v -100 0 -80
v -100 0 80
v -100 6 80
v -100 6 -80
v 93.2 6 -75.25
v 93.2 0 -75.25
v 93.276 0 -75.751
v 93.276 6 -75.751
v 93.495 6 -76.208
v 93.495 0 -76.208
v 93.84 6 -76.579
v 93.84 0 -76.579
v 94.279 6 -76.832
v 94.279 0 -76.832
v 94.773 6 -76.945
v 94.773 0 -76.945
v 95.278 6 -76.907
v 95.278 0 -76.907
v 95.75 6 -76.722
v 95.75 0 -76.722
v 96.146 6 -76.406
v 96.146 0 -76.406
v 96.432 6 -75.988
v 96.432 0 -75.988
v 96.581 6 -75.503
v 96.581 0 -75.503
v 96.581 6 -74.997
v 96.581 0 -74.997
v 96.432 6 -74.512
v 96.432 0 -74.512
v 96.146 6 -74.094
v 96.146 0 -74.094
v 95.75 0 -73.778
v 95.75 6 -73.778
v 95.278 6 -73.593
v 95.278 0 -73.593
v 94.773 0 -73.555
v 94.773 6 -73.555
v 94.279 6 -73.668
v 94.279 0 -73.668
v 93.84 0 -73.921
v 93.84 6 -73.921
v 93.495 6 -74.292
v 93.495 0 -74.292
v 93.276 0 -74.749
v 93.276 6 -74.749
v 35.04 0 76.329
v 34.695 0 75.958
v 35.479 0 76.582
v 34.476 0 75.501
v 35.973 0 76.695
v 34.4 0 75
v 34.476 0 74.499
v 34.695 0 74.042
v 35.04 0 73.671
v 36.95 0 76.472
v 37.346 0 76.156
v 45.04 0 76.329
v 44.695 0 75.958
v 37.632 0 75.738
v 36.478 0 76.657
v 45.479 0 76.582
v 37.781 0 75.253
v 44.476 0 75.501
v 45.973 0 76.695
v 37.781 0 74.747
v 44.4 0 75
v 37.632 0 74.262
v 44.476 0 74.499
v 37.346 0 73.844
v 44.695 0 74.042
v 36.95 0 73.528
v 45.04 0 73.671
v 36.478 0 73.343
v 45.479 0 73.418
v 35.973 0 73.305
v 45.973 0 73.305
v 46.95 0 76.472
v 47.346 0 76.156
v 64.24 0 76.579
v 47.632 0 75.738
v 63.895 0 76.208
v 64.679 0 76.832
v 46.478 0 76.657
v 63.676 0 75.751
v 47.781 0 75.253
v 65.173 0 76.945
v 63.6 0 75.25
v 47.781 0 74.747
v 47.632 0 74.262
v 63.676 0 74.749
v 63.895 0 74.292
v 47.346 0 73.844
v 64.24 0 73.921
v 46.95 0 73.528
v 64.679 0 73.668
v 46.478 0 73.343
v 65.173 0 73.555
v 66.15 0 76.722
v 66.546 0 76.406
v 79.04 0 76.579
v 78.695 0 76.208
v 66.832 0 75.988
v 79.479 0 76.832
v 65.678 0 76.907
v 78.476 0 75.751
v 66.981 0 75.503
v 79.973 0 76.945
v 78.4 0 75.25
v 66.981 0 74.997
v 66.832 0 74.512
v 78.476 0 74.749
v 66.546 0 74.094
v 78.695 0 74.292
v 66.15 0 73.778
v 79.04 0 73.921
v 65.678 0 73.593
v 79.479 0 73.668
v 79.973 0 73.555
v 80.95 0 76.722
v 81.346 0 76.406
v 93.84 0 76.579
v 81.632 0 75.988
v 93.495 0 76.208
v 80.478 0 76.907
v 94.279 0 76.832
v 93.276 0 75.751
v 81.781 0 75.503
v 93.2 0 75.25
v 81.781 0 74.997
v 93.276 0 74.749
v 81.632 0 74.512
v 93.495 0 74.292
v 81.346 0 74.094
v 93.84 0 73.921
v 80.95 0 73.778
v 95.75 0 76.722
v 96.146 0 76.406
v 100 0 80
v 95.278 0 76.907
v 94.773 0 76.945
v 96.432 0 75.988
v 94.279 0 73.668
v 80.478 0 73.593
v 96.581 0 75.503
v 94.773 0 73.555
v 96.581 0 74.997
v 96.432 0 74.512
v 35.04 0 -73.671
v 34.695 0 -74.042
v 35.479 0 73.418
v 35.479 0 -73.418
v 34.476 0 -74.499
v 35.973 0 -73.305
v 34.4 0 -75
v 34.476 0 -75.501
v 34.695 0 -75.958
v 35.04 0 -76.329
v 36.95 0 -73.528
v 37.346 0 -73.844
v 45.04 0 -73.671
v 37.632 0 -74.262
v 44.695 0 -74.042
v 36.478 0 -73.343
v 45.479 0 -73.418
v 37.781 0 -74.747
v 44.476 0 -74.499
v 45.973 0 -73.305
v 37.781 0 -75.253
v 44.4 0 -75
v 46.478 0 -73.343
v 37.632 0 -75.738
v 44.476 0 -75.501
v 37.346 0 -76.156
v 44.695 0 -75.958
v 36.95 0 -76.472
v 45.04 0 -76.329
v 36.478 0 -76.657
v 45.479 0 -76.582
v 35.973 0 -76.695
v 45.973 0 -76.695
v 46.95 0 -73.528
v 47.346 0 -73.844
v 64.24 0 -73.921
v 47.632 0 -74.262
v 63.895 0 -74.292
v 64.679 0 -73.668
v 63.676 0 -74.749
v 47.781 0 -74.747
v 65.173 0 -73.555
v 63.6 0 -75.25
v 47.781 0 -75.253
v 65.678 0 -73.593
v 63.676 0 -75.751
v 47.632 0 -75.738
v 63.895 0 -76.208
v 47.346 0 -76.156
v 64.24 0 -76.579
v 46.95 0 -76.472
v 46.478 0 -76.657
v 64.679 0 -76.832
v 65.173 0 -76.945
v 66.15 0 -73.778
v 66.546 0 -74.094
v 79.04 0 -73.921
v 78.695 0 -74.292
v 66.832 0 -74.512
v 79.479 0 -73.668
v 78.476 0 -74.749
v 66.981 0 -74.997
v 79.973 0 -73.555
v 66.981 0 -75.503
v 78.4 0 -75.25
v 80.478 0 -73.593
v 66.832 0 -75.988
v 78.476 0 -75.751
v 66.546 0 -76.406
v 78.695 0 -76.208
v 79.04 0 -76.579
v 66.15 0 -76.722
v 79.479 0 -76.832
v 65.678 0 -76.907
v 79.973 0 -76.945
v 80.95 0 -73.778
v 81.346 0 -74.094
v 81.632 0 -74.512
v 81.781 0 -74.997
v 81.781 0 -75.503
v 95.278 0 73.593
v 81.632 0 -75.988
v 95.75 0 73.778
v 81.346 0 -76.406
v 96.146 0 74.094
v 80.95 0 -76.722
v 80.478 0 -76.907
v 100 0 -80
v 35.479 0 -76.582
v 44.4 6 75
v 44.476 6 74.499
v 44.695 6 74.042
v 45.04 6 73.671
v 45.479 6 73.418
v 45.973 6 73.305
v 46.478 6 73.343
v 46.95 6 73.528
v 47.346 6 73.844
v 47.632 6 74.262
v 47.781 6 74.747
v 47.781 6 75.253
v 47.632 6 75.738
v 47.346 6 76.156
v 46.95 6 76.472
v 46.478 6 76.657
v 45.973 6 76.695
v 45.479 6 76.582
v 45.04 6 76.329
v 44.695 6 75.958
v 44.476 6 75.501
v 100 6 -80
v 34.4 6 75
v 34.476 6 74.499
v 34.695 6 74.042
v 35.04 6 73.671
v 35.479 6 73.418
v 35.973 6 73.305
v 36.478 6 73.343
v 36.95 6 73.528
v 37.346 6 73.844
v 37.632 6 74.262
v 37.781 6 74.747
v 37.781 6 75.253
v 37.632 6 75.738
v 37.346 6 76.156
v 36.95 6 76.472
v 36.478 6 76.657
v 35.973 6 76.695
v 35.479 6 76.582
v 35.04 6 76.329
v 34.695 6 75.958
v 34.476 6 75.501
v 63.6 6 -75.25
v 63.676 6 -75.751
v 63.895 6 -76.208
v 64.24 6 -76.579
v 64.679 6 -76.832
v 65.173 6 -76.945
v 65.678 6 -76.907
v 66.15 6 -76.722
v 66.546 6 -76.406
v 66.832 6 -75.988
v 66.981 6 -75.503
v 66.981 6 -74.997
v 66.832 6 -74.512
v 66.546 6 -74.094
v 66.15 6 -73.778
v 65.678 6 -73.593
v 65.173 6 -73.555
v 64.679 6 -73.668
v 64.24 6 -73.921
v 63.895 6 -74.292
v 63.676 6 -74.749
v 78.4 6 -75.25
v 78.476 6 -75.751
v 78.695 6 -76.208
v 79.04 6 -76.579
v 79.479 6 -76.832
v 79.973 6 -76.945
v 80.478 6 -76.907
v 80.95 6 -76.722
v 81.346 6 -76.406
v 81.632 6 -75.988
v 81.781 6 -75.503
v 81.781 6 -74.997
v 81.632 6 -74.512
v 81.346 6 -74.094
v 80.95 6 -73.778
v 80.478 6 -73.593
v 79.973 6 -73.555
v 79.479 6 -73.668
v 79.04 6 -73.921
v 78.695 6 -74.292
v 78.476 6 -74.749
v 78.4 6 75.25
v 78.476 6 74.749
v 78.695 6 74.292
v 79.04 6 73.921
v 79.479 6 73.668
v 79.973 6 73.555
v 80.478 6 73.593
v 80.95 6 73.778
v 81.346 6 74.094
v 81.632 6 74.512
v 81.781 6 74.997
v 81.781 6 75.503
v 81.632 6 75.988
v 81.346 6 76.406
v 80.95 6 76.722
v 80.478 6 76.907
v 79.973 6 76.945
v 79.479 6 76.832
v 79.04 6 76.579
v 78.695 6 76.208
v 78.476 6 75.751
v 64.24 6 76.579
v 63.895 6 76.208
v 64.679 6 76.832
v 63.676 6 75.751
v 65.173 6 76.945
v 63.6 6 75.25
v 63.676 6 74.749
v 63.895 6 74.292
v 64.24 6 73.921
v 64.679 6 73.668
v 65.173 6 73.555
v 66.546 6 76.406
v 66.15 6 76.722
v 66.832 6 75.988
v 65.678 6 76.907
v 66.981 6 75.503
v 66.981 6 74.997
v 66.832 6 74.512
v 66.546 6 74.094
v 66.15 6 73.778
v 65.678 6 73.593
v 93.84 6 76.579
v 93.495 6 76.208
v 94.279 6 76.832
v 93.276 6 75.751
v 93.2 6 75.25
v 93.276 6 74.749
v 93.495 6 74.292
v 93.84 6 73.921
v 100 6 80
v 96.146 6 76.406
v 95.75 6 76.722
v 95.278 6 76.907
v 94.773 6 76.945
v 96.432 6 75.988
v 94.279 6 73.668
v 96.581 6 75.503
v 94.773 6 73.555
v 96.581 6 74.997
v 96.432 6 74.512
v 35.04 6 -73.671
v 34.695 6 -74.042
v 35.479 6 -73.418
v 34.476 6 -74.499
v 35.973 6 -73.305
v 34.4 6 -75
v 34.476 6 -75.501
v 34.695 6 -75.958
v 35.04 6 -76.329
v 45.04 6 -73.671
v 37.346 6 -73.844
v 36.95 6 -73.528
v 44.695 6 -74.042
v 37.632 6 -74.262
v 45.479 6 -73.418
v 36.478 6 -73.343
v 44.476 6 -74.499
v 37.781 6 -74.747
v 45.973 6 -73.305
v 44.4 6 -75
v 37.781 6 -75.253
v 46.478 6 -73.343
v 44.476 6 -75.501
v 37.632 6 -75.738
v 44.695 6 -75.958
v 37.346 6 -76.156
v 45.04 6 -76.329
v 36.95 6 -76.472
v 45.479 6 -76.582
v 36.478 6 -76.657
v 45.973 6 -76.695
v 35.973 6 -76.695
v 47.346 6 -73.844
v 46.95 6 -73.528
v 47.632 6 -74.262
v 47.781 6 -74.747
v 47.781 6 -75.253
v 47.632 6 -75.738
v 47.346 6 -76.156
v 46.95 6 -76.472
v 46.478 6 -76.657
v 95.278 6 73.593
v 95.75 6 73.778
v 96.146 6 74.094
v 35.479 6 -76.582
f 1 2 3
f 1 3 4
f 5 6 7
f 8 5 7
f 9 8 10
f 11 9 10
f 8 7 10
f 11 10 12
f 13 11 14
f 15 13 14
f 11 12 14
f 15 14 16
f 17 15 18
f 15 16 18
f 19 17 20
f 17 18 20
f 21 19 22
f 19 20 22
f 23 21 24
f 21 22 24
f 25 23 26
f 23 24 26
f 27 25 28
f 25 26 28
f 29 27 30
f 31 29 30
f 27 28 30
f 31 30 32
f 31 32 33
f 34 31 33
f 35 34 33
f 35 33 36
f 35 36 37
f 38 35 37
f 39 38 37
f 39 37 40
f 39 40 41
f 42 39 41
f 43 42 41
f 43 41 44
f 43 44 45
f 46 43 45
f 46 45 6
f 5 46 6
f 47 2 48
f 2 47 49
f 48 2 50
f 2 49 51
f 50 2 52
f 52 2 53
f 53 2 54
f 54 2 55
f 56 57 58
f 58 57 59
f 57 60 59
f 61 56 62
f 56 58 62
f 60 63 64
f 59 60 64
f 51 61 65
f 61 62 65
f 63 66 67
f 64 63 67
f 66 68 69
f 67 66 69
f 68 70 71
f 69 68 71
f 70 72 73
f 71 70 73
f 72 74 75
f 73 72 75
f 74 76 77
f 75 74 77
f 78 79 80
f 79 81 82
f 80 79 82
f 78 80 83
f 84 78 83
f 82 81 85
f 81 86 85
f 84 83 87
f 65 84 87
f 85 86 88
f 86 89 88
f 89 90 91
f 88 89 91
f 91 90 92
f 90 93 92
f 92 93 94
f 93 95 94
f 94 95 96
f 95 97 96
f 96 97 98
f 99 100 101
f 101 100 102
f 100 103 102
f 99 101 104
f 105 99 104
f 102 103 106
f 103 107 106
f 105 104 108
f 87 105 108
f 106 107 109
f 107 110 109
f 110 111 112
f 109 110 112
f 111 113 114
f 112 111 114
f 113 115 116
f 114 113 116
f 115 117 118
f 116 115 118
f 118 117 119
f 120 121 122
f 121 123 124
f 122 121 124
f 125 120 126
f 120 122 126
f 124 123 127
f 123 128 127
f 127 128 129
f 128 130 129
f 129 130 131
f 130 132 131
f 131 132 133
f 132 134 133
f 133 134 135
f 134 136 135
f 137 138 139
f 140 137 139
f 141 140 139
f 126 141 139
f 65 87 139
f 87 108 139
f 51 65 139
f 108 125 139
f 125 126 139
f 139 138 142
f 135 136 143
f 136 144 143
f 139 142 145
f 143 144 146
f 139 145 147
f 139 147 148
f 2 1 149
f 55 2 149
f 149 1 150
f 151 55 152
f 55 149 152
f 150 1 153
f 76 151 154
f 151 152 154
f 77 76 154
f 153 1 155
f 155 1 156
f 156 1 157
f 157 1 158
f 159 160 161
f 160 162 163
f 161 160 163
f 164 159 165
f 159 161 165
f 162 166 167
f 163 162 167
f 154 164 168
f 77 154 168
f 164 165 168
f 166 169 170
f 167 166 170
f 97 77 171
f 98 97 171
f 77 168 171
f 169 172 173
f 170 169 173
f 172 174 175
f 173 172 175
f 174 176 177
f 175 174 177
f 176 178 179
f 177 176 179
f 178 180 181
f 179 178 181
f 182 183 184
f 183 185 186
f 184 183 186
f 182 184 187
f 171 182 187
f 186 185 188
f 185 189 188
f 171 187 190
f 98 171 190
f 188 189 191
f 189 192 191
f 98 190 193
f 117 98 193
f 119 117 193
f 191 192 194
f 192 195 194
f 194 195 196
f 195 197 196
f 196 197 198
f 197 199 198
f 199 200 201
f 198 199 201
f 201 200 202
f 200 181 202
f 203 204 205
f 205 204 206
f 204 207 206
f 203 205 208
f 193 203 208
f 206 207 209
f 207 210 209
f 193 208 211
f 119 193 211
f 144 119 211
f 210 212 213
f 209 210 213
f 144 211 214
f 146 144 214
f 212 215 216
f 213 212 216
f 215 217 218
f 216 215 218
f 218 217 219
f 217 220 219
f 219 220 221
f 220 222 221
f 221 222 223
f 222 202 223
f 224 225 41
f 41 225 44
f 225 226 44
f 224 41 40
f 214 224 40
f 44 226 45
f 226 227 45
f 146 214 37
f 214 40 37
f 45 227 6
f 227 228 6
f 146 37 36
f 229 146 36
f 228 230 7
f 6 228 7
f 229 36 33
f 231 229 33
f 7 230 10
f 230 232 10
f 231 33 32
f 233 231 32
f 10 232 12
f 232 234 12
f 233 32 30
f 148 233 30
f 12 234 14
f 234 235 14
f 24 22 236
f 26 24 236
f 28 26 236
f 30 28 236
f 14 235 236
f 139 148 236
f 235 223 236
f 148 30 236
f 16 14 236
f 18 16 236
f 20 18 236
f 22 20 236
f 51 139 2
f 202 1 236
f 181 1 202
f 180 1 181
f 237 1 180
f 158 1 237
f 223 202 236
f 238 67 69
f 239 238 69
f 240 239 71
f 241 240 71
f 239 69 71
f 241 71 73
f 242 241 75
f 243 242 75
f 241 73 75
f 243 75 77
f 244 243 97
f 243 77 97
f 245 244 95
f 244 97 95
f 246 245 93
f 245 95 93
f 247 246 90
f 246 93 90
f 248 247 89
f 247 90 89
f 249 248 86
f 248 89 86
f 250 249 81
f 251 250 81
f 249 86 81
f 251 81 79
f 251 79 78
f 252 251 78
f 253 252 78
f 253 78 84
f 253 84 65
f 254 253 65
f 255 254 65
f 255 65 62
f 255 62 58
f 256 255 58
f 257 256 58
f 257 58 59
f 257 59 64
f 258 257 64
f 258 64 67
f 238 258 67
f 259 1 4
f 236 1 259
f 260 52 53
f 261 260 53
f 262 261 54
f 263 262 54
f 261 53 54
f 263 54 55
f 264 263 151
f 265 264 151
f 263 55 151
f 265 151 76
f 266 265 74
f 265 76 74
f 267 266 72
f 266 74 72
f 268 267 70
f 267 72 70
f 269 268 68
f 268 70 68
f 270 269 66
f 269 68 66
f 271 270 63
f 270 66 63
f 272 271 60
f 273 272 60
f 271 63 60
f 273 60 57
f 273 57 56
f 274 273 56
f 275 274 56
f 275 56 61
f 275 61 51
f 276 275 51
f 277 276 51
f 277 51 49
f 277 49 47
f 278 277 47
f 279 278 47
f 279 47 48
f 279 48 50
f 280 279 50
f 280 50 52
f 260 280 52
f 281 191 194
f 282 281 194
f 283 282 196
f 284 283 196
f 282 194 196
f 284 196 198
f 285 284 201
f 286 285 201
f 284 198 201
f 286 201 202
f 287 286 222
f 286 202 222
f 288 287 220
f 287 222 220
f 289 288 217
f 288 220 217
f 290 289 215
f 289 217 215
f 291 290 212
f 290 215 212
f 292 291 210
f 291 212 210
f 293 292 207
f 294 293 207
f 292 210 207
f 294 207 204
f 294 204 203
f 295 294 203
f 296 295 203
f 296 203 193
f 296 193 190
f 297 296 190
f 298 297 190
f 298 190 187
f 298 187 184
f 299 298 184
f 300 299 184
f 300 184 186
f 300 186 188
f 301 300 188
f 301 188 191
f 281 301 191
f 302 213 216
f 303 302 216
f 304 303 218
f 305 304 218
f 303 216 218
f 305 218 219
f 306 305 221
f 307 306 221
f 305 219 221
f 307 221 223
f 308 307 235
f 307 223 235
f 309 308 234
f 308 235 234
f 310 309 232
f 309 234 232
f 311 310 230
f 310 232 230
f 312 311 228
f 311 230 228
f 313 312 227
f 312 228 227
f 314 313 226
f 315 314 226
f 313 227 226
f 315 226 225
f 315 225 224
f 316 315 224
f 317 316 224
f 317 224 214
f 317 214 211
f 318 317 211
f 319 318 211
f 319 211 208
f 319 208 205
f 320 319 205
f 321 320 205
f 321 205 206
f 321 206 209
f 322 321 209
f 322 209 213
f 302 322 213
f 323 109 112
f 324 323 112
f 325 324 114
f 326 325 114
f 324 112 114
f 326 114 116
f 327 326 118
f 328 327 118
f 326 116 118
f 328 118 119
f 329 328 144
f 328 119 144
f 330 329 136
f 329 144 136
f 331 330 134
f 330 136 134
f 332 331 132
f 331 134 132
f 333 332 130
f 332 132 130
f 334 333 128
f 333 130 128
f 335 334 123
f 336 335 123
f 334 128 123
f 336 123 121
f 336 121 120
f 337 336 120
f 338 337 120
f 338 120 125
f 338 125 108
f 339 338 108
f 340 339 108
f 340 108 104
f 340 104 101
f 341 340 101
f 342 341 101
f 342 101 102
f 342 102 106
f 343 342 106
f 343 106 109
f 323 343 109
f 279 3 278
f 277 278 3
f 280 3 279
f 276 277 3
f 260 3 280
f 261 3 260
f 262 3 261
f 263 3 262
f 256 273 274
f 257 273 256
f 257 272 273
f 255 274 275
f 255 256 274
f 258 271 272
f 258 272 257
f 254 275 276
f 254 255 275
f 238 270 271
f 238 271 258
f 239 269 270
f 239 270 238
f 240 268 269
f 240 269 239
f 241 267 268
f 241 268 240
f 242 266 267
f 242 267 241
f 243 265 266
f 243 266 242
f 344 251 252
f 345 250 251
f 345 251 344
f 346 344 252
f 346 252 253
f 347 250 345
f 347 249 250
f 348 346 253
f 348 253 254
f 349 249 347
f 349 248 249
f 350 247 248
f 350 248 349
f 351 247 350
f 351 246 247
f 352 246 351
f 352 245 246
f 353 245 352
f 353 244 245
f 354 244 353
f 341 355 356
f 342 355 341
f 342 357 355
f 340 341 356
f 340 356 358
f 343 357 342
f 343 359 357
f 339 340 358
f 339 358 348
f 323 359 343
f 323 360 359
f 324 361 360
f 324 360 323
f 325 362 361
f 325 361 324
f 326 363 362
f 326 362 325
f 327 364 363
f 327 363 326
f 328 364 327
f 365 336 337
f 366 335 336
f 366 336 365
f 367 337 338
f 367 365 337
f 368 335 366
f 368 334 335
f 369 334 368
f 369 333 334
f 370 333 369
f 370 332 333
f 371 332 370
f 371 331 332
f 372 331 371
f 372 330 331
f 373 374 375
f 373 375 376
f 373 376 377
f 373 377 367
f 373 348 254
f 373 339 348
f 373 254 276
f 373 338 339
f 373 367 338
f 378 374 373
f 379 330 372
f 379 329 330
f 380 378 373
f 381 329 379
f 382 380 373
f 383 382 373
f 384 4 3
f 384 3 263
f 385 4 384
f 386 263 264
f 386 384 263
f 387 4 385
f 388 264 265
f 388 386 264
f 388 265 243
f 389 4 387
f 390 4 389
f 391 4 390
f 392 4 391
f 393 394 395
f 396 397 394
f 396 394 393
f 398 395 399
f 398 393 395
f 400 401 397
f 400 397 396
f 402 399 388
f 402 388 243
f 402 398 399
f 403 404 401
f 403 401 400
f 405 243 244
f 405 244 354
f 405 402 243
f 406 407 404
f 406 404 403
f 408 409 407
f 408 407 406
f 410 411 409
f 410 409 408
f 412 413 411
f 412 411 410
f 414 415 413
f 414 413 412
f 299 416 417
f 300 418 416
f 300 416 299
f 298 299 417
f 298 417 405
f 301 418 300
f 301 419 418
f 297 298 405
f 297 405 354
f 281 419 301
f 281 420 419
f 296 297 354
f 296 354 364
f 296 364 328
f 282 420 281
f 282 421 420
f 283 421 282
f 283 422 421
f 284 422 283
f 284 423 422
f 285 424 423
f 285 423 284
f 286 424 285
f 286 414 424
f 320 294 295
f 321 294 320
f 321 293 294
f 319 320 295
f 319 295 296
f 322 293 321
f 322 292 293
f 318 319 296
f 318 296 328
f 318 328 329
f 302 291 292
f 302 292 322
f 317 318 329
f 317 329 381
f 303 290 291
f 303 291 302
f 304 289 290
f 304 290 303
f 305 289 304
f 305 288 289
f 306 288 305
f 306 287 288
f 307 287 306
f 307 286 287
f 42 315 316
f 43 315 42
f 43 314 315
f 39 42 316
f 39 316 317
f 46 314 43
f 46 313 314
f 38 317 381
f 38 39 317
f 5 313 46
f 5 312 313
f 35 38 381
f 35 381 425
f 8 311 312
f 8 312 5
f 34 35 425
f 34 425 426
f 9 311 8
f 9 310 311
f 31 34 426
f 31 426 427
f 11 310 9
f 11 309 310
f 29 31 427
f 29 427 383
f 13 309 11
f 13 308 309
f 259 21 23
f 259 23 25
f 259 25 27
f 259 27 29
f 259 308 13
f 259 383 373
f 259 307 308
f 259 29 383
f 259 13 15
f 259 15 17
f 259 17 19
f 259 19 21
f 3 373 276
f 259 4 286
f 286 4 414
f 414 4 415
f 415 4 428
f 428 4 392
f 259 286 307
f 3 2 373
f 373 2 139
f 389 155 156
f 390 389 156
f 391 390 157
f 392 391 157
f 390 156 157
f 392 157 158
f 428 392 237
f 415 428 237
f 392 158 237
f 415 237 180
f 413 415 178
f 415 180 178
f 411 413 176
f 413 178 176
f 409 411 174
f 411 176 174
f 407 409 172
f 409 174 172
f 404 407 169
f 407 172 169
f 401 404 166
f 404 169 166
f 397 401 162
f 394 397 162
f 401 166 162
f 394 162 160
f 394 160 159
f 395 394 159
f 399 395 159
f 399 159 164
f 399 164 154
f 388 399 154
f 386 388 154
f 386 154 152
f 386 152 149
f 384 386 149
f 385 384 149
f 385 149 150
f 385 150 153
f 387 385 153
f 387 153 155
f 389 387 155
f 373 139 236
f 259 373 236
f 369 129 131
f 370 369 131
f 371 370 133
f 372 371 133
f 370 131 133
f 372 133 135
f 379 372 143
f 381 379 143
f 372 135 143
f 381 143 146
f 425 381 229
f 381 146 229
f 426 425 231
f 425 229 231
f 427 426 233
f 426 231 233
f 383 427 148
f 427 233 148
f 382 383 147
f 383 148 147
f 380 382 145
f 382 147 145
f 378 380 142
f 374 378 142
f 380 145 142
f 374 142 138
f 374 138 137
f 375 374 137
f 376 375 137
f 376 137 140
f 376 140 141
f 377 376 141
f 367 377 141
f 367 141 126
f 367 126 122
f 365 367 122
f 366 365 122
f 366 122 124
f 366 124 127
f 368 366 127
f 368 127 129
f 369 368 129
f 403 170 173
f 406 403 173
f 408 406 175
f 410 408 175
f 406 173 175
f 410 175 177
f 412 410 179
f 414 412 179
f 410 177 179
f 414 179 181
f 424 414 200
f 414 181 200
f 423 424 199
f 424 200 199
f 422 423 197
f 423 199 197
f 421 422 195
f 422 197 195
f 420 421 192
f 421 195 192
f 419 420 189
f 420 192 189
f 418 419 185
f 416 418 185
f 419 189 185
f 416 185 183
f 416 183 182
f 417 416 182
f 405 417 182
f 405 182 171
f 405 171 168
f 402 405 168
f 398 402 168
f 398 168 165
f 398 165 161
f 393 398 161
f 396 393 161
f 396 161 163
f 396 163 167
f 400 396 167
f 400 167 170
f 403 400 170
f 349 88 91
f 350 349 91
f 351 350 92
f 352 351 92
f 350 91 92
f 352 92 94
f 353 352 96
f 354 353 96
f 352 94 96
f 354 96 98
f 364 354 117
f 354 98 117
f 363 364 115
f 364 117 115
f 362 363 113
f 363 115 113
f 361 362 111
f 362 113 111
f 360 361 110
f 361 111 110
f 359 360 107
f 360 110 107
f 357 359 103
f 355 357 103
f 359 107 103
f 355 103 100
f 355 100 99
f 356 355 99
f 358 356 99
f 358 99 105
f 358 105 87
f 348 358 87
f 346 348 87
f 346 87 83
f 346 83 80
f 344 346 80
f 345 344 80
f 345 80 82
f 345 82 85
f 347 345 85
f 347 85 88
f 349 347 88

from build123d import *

# Parameters (mm, degrees)
SKETCH1_W            = 200
SKETCH1_H            = 160
BOSS_EXTRUDE1_DEPTH  = 6
M3_CLEARANCE_HOLE1_D = 3.4
M3_CLEARANCE_HOLE2_D = 3.4


with BuildPart() as part:
    # Sketch1 → Boss-Extrude1 (new body)
    with BuildSketch(Plane(origin=(0, 0, 0), x_dir=(1, 0, 0), z_dir=(0, 1, 0))):
        Rectangle(SKETCH1_W, SKETCH1_H)
    extrude(amount=BOSS_EXTRUDE1_DEPTH)

    # M3 Clearance Hole1 (through all)
    with Locations(Plane(origin=(0, 6, 0), x_dir=(1, 0, 0), z_dir=(0, 1, 0))):
        with Locations((36.1, -75), (46.1, -75), (36.1, 75), (46.1, 75)):
            Hole(M3_CLEARANCE_HOLE1_D / 2)

    # M3 Clearance Hole2 (through all)
    with Locations(Plane(origin=(0, 6, 0), x_dir=(1, 0, 0), z_dir=(0, 1, 0))):
        with Locations((94.9, -75.25), (80.1, -75.25), (65.3, -75.25), (94.9, 75.25), (80.1, 75.25), (65.3, 75.25)):
            Hole(M3_CLEARANCE_HOLE2_D / 2)


solid = part.part
